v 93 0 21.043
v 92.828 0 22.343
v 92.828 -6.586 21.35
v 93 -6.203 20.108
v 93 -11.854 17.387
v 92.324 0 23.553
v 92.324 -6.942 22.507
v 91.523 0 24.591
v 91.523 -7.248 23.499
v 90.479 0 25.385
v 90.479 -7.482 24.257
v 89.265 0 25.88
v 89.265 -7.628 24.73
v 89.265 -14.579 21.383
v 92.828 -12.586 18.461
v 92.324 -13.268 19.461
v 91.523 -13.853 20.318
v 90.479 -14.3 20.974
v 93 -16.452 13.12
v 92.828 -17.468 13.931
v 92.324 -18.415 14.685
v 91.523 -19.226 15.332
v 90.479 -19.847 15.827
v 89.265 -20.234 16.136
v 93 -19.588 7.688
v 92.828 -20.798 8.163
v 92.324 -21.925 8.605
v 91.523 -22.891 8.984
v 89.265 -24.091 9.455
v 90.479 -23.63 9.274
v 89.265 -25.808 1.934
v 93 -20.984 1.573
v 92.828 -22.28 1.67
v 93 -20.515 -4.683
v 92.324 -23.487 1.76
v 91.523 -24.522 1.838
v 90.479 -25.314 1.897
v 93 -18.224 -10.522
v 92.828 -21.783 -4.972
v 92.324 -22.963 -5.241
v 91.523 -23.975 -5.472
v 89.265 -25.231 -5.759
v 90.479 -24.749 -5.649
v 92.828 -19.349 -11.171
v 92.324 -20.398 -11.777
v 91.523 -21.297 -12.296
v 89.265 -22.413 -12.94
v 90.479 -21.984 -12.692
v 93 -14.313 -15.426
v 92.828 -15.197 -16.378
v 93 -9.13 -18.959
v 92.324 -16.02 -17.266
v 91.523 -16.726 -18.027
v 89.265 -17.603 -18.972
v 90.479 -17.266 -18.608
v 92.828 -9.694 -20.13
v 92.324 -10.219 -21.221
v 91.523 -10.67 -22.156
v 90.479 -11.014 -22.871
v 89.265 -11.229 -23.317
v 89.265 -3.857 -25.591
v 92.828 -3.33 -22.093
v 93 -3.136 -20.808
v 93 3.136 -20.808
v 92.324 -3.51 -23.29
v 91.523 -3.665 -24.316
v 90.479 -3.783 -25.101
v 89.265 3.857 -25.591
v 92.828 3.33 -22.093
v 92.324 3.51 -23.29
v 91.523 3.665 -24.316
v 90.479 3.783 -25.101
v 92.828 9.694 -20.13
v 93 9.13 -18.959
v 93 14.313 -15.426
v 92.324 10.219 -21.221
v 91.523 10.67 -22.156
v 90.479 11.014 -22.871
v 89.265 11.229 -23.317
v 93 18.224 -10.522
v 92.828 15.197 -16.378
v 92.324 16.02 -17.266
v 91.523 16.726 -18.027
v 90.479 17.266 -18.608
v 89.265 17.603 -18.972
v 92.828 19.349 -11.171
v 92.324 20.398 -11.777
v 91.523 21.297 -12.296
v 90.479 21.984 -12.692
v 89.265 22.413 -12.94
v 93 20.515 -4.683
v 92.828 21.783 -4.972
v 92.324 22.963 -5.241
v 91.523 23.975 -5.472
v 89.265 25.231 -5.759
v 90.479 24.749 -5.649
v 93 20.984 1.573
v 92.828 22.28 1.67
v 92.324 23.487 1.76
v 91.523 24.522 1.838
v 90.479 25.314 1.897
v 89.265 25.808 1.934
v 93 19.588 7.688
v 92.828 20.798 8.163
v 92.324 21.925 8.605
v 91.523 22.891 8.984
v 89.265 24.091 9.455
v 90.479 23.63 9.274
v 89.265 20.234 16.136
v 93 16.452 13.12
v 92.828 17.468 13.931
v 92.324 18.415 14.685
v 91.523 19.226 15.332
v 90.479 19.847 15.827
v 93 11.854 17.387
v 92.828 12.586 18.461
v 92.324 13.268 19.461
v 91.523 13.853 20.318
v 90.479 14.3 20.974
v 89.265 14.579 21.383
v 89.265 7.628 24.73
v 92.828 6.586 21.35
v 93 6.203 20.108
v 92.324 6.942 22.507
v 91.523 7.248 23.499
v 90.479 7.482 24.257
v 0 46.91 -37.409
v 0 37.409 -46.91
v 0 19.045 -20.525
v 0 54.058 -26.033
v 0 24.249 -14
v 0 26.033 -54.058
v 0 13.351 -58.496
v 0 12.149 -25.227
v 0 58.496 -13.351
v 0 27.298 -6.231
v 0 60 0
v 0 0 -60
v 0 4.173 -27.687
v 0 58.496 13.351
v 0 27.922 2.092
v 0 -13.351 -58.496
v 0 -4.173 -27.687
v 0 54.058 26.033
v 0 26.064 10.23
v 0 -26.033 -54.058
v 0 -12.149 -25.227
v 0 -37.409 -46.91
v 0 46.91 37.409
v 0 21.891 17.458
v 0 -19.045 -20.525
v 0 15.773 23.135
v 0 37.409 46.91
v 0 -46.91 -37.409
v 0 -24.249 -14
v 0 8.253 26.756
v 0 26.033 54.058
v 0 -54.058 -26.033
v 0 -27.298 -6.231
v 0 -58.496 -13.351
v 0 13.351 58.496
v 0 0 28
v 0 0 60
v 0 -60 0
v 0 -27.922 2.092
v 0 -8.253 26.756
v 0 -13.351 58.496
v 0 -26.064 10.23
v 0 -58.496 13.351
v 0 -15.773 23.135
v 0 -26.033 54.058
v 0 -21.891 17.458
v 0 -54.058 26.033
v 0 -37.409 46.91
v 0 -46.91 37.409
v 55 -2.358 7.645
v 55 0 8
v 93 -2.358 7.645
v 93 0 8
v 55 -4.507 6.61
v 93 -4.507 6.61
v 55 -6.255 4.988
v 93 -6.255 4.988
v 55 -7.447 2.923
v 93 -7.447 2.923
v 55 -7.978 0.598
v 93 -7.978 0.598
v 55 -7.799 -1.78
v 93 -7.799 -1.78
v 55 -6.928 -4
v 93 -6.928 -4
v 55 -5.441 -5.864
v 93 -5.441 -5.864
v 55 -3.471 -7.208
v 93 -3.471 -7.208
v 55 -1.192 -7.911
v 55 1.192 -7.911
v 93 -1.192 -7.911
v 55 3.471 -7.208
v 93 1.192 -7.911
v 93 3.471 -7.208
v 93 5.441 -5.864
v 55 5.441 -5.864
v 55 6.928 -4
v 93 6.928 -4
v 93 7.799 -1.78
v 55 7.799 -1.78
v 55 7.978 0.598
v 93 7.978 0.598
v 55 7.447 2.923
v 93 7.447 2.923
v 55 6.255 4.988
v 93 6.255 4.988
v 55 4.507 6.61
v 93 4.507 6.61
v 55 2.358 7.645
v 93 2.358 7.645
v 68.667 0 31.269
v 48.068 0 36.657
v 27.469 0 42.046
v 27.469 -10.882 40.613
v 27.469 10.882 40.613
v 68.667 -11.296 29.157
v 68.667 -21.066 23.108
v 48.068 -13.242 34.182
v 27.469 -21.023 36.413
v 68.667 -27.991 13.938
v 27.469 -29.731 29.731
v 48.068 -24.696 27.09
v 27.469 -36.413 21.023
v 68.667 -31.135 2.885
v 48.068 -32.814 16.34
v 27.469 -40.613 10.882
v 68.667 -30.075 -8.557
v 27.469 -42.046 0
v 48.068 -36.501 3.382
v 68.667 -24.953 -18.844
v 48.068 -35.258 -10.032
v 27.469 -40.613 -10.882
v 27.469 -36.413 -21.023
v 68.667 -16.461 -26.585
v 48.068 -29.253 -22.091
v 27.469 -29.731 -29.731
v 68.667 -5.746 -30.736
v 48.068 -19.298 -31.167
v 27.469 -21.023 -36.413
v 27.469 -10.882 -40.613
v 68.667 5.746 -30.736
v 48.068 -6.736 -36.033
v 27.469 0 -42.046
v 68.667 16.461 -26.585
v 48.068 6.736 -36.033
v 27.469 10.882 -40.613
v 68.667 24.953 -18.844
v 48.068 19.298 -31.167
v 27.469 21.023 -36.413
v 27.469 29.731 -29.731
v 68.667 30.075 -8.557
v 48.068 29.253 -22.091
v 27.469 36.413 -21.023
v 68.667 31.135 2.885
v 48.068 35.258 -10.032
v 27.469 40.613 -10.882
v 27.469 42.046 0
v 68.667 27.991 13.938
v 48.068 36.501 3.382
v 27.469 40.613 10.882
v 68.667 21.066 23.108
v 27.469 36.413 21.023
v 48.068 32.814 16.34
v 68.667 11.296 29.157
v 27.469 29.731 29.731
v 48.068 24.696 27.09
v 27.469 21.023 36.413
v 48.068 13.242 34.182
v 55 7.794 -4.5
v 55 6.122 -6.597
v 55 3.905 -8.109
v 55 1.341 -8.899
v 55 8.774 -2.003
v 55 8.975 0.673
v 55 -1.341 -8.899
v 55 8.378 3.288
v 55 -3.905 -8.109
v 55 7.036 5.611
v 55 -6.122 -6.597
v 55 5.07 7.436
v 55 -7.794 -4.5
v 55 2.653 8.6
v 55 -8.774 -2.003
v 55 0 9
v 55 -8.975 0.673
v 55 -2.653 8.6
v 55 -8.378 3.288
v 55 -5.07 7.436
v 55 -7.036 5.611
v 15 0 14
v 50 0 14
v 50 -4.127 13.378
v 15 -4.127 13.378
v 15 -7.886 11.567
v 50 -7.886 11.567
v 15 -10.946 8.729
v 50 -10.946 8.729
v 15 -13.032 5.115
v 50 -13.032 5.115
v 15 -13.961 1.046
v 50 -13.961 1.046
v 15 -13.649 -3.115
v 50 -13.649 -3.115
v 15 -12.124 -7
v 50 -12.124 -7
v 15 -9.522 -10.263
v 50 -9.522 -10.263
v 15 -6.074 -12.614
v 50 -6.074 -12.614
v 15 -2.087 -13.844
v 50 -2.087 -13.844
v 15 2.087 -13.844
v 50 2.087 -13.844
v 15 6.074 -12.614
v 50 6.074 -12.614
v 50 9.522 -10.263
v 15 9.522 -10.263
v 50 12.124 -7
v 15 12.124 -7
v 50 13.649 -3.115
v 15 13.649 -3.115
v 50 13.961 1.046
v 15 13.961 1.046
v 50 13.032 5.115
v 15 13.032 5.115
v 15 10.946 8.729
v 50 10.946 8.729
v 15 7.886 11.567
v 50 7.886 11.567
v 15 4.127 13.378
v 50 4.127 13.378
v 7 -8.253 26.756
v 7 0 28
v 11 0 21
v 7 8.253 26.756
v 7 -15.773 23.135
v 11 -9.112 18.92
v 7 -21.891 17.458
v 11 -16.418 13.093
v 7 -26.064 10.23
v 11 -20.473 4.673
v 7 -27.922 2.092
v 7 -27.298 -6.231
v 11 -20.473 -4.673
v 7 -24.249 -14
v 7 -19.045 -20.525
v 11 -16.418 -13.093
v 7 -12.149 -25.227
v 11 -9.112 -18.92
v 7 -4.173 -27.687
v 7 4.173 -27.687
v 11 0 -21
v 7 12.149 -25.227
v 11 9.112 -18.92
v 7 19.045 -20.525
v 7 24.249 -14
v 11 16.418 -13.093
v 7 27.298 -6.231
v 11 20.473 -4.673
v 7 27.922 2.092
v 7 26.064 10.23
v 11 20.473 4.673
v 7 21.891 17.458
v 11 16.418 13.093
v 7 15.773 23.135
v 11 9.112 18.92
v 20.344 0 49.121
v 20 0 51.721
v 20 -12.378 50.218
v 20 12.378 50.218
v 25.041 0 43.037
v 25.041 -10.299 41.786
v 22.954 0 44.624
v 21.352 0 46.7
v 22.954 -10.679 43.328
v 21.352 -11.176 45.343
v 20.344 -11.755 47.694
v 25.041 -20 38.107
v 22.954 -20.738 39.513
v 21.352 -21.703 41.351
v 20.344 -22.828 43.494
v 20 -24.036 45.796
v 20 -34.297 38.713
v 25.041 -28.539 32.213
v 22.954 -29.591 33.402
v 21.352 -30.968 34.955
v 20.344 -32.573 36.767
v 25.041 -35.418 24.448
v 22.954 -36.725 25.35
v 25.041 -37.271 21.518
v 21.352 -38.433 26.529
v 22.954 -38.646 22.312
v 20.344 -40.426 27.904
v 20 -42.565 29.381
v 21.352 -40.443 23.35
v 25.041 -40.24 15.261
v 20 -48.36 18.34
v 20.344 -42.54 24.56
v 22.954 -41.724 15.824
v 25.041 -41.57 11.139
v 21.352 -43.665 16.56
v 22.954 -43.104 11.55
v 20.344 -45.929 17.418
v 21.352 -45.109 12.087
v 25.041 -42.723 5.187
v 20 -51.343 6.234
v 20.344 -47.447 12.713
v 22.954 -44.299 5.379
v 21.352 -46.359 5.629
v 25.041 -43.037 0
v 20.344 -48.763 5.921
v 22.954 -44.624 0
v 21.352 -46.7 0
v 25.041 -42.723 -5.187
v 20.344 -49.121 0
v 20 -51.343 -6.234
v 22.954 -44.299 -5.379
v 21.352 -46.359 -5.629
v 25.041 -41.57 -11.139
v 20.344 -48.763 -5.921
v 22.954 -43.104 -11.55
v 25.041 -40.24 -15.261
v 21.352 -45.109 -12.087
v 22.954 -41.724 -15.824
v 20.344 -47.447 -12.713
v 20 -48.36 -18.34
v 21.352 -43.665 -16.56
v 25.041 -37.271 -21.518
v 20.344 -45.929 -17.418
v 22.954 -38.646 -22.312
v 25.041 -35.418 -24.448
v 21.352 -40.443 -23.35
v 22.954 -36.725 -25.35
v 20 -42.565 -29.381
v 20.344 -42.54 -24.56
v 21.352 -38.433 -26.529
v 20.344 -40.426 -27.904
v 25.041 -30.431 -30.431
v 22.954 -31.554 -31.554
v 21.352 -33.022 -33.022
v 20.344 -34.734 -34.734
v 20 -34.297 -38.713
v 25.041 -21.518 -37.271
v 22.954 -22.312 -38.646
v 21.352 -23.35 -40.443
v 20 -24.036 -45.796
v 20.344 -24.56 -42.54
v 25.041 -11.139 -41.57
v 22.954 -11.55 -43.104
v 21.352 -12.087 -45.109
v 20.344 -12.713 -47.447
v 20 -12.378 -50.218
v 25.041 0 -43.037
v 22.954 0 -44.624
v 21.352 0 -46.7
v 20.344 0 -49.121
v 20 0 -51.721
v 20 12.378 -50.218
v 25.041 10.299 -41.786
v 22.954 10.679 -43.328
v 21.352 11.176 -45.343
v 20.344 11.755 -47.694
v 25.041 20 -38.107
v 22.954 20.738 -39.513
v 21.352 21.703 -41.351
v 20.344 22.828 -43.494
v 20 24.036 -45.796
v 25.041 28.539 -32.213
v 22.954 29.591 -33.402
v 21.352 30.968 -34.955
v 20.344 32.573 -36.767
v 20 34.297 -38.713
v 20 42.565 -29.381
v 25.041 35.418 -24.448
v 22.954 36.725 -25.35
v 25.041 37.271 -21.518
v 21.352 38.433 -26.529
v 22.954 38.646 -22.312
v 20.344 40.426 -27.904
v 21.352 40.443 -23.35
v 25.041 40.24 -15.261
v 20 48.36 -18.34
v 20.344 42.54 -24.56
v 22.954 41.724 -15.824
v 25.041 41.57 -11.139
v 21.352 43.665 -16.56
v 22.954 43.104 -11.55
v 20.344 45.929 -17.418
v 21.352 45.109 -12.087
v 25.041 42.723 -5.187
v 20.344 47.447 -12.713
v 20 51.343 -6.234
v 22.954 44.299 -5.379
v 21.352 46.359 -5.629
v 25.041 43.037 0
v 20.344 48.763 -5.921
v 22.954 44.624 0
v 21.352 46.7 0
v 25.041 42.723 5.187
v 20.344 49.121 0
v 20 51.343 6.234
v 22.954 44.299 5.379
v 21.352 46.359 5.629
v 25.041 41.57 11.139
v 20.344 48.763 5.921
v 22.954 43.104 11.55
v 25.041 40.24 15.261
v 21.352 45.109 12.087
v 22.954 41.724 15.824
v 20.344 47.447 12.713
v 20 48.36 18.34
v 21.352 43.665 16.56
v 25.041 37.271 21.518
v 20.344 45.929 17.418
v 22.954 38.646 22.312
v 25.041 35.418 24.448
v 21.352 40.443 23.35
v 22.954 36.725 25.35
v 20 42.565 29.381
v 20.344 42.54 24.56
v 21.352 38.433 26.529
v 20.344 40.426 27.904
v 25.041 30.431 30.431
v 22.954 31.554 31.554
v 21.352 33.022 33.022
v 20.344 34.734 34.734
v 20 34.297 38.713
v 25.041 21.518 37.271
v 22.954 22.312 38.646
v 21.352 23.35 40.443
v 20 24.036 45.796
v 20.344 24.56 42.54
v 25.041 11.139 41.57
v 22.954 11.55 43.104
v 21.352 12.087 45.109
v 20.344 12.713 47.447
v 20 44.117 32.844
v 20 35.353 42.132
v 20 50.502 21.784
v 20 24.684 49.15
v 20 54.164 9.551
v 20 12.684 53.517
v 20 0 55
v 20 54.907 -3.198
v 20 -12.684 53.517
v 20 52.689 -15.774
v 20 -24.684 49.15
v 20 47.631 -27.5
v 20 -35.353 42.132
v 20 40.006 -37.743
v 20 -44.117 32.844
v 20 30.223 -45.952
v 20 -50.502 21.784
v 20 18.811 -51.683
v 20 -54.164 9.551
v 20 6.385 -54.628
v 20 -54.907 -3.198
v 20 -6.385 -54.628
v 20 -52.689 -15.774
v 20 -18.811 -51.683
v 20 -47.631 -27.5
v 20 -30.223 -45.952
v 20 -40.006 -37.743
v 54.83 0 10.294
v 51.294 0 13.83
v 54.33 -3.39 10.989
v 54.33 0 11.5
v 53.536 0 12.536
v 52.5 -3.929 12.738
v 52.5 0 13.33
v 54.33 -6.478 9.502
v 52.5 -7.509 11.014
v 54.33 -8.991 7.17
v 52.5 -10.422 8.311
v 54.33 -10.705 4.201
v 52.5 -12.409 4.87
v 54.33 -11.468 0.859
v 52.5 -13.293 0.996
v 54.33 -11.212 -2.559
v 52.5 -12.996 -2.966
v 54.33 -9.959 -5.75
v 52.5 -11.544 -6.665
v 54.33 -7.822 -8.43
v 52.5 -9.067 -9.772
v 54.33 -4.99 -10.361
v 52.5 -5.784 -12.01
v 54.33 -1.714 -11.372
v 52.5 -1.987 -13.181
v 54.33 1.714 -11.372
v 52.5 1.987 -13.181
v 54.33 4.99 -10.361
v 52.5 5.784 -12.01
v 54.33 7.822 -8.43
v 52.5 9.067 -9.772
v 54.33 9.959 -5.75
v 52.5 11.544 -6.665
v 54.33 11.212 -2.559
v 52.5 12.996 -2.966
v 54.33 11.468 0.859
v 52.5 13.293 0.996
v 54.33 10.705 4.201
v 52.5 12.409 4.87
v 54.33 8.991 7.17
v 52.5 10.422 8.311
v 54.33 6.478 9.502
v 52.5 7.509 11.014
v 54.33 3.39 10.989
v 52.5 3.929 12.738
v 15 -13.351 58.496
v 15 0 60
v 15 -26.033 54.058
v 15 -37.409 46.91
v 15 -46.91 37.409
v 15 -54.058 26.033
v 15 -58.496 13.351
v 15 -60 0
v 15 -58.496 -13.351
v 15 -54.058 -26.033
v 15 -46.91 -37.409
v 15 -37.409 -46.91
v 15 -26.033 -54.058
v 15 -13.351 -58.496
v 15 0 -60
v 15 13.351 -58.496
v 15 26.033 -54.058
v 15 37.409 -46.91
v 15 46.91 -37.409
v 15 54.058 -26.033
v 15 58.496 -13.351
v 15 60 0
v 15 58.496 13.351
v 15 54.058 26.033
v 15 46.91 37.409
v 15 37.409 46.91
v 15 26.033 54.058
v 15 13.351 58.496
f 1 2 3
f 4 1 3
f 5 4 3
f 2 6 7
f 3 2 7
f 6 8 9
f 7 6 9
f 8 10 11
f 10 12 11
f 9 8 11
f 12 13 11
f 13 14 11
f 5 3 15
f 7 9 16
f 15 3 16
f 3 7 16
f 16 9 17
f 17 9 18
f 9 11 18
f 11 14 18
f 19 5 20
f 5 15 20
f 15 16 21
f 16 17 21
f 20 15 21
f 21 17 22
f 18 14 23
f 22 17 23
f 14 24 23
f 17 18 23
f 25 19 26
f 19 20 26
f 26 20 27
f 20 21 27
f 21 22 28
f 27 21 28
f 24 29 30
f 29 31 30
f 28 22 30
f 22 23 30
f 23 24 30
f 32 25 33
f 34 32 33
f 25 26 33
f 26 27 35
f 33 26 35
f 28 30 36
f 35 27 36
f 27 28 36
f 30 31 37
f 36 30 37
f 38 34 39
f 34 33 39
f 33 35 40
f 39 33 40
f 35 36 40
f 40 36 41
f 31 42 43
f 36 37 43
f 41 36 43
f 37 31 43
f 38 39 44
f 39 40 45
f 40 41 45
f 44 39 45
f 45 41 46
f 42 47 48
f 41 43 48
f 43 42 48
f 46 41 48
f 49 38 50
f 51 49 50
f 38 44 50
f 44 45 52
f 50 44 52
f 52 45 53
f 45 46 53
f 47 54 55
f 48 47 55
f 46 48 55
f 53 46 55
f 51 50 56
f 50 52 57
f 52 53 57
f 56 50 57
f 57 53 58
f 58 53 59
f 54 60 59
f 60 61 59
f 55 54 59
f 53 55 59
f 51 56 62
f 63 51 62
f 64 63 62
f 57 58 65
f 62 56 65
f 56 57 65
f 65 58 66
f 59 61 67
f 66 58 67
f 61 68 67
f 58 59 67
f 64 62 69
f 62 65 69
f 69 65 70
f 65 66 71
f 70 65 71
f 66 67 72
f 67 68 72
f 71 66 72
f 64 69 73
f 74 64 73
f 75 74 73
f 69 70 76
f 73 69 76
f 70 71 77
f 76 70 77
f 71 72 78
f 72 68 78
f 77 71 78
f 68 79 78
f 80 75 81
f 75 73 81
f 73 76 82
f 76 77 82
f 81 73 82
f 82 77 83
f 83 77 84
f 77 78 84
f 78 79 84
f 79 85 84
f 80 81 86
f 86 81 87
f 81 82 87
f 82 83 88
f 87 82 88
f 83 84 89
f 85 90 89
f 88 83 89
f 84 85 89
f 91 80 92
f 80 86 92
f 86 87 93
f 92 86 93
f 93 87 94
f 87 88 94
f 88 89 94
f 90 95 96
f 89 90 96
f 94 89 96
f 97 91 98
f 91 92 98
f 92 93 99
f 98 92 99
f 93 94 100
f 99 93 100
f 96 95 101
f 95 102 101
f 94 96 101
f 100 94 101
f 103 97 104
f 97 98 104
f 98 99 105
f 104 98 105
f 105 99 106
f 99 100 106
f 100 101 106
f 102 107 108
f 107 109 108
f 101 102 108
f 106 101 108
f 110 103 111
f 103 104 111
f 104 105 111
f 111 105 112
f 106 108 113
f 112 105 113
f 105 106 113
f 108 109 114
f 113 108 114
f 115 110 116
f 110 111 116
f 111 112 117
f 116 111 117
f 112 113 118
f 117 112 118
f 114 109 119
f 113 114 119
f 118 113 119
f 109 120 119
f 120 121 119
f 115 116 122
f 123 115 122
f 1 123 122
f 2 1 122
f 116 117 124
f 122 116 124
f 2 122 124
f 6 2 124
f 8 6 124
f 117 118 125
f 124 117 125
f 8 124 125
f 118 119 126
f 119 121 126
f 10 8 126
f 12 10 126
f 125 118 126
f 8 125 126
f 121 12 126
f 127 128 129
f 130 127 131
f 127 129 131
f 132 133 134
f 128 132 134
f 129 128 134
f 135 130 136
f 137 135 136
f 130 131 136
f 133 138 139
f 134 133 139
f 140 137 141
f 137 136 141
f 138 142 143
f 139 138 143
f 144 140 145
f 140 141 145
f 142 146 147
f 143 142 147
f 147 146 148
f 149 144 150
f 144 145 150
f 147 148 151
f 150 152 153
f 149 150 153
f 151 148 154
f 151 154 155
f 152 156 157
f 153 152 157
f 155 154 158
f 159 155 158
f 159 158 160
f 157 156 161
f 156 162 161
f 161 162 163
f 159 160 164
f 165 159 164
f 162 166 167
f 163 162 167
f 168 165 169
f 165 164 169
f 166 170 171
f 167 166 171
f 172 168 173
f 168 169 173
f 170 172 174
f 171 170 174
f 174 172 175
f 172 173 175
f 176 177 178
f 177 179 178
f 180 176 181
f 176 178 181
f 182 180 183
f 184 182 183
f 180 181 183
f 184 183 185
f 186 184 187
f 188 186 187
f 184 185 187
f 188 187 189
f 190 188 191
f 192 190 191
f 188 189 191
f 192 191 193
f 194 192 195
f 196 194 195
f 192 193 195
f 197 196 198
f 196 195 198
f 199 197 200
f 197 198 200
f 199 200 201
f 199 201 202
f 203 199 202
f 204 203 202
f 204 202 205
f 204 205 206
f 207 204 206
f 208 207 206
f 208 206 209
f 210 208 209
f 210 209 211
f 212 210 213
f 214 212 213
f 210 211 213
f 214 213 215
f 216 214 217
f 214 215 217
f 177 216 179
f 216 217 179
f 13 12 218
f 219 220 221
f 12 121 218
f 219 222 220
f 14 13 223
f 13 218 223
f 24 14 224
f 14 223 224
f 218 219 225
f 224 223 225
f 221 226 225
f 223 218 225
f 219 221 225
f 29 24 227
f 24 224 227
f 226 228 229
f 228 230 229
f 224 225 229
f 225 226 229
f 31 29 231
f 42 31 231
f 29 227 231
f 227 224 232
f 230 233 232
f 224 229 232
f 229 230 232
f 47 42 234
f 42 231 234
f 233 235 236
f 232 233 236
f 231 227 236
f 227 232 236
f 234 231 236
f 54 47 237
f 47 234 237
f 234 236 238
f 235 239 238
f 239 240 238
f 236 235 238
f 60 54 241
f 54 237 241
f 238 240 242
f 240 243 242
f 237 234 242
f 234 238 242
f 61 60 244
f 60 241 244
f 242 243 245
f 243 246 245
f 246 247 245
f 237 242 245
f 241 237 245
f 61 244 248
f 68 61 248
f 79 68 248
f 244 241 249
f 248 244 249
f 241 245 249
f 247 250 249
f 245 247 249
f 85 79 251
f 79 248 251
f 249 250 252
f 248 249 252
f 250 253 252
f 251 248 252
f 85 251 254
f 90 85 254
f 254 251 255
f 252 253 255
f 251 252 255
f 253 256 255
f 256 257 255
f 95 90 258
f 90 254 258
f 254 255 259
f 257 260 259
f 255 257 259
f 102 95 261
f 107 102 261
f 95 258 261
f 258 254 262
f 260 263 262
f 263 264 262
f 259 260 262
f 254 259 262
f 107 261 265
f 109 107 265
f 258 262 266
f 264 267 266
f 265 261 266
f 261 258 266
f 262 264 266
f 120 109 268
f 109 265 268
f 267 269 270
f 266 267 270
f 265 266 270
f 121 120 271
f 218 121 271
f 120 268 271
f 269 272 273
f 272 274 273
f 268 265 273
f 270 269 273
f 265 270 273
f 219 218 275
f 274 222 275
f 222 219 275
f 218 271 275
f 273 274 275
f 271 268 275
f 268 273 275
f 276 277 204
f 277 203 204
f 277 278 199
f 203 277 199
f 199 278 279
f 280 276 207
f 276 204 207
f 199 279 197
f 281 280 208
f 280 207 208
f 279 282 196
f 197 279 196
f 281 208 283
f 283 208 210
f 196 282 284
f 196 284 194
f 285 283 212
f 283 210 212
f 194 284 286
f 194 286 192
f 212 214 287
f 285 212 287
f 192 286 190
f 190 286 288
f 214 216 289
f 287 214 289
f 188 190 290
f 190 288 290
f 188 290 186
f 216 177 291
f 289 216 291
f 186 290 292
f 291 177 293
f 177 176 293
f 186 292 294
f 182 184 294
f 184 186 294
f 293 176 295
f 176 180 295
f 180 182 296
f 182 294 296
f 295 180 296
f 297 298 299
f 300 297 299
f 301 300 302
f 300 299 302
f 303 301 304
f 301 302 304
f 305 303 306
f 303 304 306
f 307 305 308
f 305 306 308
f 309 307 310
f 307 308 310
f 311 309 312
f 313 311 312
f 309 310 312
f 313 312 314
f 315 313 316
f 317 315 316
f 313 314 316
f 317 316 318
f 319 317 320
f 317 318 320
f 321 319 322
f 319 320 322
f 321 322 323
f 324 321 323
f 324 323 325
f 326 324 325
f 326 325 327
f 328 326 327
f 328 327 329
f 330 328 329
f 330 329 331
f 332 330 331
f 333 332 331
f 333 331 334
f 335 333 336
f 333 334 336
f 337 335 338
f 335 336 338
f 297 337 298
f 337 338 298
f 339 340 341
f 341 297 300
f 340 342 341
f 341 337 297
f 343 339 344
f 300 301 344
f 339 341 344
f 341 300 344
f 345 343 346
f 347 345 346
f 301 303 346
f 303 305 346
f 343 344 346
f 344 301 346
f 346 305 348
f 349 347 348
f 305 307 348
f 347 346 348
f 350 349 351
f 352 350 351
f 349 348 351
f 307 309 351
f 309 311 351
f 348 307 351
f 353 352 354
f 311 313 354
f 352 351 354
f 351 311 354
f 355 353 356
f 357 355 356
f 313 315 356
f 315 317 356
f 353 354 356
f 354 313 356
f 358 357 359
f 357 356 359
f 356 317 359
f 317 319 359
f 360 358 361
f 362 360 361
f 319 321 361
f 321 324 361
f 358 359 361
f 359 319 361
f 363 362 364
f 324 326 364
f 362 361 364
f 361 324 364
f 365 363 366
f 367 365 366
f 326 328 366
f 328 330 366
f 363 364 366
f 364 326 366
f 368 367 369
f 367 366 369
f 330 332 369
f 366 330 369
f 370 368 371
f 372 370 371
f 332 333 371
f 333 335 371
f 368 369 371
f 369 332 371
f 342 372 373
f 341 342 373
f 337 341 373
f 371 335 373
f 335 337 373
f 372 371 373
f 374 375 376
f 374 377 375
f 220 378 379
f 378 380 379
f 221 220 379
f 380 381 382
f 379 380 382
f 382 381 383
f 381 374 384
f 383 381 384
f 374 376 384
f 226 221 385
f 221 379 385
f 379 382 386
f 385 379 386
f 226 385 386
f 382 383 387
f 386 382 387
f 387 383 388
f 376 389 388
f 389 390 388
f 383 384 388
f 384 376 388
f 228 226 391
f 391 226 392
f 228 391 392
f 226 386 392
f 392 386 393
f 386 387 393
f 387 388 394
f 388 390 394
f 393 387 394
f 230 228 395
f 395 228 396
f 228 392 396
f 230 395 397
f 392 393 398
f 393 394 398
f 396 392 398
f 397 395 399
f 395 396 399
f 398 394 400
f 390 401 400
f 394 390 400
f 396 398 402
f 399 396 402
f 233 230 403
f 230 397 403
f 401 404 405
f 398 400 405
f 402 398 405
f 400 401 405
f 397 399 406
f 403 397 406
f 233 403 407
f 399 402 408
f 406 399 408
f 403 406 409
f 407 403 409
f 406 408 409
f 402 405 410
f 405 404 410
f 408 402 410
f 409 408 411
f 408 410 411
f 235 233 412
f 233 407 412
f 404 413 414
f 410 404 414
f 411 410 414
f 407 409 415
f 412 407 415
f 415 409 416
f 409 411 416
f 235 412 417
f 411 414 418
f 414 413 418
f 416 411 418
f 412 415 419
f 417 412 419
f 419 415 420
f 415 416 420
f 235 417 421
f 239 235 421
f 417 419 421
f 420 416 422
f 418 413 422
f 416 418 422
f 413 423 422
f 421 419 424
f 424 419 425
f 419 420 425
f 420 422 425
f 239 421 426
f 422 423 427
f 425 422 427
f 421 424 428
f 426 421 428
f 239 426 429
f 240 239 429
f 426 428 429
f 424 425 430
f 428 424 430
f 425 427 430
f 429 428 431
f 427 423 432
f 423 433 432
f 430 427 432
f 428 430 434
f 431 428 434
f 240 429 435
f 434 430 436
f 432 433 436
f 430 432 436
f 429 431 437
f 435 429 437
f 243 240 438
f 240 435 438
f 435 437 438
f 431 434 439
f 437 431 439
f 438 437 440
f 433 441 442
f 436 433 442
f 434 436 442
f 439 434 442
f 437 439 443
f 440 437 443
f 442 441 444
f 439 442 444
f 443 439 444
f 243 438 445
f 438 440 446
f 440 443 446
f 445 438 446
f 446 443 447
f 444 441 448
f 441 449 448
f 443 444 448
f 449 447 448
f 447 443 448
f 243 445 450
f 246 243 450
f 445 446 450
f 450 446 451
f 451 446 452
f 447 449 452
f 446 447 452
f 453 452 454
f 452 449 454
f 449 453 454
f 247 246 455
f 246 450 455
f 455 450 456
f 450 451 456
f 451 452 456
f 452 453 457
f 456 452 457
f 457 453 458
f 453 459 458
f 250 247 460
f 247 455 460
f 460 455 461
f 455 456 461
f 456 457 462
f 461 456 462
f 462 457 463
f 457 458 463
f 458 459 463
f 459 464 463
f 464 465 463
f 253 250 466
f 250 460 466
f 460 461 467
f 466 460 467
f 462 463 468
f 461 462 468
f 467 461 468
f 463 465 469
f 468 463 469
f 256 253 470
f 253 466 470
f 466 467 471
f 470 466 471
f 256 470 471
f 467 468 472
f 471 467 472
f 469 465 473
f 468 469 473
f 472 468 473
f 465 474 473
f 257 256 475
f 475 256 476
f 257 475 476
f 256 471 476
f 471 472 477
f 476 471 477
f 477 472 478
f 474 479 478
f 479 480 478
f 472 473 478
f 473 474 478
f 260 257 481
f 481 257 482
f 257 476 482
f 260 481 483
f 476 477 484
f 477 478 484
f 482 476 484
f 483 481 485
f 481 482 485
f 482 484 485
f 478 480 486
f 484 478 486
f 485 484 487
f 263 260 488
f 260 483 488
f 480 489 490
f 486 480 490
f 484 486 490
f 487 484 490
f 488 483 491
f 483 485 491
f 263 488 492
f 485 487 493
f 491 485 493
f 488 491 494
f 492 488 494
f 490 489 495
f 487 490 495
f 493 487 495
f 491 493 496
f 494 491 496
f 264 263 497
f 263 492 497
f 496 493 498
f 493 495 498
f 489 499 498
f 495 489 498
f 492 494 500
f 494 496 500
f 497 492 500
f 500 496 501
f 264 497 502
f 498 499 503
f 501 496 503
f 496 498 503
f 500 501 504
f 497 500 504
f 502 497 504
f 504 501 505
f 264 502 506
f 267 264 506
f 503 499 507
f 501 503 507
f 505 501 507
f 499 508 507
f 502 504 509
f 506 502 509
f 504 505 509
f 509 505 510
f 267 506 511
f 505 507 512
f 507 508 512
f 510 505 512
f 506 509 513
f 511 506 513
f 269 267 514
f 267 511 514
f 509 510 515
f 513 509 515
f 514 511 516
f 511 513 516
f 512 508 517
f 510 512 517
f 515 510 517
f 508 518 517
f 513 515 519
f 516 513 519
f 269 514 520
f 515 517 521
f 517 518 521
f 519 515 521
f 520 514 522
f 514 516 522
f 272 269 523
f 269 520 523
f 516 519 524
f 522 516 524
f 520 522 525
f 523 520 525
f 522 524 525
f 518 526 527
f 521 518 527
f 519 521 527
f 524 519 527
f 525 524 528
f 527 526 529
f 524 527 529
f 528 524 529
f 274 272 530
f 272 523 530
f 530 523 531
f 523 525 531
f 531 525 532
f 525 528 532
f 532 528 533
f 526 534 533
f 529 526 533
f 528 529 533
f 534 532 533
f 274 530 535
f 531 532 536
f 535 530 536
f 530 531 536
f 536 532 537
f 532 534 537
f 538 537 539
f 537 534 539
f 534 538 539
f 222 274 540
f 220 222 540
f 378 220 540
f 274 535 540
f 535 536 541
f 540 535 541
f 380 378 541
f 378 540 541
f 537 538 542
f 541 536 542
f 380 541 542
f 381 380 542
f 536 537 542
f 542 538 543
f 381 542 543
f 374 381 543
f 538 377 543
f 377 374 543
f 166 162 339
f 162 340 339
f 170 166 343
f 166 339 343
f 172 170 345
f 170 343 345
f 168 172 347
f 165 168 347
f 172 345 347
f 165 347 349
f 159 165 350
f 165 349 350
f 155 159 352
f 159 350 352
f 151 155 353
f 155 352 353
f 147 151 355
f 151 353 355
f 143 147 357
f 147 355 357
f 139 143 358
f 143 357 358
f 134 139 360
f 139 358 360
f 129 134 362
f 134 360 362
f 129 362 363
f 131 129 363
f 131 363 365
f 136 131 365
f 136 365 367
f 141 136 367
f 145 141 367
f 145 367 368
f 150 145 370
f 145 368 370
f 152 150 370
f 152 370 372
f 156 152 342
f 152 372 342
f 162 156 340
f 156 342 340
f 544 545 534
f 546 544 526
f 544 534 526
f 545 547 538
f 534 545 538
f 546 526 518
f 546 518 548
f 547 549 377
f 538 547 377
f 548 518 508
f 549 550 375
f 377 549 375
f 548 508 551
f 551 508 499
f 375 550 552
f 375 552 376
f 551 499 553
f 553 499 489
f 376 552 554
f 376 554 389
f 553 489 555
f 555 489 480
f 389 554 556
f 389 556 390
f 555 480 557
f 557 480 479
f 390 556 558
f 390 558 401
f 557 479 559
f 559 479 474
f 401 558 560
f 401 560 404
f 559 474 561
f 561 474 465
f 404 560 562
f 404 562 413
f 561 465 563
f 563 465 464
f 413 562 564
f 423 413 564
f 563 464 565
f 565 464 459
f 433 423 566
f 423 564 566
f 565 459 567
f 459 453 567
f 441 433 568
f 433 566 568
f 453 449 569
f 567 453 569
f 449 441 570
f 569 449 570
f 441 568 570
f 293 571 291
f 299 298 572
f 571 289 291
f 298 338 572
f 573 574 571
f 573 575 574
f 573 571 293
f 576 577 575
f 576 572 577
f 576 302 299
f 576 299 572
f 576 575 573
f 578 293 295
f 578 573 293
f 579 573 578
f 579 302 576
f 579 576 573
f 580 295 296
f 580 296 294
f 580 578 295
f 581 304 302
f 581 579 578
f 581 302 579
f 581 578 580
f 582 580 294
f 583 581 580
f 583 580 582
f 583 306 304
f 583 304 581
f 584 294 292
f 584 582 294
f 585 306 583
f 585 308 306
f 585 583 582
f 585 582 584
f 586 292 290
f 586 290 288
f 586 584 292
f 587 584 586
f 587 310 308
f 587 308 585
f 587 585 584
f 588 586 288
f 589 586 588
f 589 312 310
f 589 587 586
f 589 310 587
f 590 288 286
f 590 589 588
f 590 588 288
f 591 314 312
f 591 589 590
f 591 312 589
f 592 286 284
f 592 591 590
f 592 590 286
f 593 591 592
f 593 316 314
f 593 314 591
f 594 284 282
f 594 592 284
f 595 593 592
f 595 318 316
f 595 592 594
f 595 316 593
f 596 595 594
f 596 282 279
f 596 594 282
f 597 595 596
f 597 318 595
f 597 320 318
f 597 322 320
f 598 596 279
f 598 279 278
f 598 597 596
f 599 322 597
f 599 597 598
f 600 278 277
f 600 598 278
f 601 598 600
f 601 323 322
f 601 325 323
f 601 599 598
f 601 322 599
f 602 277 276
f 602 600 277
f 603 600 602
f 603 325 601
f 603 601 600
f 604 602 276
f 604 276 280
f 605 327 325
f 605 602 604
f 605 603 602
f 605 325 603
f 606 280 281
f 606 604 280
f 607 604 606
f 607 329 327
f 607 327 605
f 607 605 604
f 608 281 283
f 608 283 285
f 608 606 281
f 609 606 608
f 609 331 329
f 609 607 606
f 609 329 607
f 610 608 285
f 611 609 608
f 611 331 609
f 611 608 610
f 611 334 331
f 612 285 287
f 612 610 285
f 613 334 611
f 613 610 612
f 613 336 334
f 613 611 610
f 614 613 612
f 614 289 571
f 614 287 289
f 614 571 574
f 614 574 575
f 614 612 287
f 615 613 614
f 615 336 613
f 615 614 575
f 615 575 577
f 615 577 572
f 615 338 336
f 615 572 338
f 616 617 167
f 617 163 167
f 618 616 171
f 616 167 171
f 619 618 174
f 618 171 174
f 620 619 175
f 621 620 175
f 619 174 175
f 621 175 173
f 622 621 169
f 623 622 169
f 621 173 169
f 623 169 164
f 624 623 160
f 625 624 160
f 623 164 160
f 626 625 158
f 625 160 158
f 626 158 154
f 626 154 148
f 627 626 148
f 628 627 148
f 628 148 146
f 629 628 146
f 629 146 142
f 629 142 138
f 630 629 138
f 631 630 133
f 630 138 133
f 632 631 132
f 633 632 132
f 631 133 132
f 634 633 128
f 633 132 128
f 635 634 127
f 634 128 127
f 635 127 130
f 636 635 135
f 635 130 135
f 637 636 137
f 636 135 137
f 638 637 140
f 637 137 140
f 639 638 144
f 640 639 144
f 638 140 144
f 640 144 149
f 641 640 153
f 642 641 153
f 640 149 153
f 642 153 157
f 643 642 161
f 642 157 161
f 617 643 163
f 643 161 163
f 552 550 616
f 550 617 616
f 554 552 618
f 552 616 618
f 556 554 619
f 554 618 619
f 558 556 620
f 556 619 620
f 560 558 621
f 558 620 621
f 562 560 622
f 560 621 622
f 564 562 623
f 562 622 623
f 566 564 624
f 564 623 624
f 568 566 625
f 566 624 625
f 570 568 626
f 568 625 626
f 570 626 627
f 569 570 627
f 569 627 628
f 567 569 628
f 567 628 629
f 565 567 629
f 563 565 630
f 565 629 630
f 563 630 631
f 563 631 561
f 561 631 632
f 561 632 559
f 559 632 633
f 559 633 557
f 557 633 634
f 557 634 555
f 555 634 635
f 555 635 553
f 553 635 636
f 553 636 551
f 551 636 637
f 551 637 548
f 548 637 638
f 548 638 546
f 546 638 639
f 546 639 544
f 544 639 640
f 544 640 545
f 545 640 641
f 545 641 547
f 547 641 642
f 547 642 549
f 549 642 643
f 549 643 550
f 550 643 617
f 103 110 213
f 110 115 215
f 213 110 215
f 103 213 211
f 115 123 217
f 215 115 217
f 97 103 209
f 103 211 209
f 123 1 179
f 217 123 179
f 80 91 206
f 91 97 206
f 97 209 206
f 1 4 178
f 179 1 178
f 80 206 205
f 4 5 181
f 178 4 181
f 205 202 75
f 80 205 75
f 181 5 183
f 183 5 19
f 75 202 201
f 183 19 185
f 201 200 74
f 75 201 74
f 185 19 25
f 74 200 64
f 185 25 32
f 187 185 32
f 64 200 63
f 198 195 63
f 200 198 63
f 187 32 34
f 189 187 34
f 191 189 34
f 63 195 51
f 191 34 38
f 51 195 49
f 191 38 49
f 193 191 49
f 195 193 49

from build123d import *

# Parameters (mm, degrees)
F2_R = 5
F3_R = 10
F4_R = 5


with BuildPart() as f1:
    # F0 (on Front) → F1 (revolve)
    with BuildSketch(Plane.XZ):
        Polygon((55, 8), (93, 8), (93, 24.90327), (20, 44), (20, 55), (15, 60), (0, 60), (0, 28), (7, 28), (15, 14), (55, 14), align=None)
    revolve(axis=Axis((54.39201, 0, 0), (1, 0, 0)))

    # F2
    f2_edges = [f1.edges().sort_by_distance(p)[0] for p in [
        (93, 0, -24.90327),
    ]]
    fillet(f2_edges, radius=F2_R)

    # F3
    f3_edges = [f1.edges().sort_by_distance(p)[0] for p in [
        (20, 0, -44),
    ]]
    fillet(f3_edges, radius=F3_R)

    # F4
    f4_edges = [f1.edges().sort_by_distance(p)[0] for p in [
        (55, 0, -14),
    ]]
    fillet(f4_edges, radius=F4_R)


solid = f1.part
